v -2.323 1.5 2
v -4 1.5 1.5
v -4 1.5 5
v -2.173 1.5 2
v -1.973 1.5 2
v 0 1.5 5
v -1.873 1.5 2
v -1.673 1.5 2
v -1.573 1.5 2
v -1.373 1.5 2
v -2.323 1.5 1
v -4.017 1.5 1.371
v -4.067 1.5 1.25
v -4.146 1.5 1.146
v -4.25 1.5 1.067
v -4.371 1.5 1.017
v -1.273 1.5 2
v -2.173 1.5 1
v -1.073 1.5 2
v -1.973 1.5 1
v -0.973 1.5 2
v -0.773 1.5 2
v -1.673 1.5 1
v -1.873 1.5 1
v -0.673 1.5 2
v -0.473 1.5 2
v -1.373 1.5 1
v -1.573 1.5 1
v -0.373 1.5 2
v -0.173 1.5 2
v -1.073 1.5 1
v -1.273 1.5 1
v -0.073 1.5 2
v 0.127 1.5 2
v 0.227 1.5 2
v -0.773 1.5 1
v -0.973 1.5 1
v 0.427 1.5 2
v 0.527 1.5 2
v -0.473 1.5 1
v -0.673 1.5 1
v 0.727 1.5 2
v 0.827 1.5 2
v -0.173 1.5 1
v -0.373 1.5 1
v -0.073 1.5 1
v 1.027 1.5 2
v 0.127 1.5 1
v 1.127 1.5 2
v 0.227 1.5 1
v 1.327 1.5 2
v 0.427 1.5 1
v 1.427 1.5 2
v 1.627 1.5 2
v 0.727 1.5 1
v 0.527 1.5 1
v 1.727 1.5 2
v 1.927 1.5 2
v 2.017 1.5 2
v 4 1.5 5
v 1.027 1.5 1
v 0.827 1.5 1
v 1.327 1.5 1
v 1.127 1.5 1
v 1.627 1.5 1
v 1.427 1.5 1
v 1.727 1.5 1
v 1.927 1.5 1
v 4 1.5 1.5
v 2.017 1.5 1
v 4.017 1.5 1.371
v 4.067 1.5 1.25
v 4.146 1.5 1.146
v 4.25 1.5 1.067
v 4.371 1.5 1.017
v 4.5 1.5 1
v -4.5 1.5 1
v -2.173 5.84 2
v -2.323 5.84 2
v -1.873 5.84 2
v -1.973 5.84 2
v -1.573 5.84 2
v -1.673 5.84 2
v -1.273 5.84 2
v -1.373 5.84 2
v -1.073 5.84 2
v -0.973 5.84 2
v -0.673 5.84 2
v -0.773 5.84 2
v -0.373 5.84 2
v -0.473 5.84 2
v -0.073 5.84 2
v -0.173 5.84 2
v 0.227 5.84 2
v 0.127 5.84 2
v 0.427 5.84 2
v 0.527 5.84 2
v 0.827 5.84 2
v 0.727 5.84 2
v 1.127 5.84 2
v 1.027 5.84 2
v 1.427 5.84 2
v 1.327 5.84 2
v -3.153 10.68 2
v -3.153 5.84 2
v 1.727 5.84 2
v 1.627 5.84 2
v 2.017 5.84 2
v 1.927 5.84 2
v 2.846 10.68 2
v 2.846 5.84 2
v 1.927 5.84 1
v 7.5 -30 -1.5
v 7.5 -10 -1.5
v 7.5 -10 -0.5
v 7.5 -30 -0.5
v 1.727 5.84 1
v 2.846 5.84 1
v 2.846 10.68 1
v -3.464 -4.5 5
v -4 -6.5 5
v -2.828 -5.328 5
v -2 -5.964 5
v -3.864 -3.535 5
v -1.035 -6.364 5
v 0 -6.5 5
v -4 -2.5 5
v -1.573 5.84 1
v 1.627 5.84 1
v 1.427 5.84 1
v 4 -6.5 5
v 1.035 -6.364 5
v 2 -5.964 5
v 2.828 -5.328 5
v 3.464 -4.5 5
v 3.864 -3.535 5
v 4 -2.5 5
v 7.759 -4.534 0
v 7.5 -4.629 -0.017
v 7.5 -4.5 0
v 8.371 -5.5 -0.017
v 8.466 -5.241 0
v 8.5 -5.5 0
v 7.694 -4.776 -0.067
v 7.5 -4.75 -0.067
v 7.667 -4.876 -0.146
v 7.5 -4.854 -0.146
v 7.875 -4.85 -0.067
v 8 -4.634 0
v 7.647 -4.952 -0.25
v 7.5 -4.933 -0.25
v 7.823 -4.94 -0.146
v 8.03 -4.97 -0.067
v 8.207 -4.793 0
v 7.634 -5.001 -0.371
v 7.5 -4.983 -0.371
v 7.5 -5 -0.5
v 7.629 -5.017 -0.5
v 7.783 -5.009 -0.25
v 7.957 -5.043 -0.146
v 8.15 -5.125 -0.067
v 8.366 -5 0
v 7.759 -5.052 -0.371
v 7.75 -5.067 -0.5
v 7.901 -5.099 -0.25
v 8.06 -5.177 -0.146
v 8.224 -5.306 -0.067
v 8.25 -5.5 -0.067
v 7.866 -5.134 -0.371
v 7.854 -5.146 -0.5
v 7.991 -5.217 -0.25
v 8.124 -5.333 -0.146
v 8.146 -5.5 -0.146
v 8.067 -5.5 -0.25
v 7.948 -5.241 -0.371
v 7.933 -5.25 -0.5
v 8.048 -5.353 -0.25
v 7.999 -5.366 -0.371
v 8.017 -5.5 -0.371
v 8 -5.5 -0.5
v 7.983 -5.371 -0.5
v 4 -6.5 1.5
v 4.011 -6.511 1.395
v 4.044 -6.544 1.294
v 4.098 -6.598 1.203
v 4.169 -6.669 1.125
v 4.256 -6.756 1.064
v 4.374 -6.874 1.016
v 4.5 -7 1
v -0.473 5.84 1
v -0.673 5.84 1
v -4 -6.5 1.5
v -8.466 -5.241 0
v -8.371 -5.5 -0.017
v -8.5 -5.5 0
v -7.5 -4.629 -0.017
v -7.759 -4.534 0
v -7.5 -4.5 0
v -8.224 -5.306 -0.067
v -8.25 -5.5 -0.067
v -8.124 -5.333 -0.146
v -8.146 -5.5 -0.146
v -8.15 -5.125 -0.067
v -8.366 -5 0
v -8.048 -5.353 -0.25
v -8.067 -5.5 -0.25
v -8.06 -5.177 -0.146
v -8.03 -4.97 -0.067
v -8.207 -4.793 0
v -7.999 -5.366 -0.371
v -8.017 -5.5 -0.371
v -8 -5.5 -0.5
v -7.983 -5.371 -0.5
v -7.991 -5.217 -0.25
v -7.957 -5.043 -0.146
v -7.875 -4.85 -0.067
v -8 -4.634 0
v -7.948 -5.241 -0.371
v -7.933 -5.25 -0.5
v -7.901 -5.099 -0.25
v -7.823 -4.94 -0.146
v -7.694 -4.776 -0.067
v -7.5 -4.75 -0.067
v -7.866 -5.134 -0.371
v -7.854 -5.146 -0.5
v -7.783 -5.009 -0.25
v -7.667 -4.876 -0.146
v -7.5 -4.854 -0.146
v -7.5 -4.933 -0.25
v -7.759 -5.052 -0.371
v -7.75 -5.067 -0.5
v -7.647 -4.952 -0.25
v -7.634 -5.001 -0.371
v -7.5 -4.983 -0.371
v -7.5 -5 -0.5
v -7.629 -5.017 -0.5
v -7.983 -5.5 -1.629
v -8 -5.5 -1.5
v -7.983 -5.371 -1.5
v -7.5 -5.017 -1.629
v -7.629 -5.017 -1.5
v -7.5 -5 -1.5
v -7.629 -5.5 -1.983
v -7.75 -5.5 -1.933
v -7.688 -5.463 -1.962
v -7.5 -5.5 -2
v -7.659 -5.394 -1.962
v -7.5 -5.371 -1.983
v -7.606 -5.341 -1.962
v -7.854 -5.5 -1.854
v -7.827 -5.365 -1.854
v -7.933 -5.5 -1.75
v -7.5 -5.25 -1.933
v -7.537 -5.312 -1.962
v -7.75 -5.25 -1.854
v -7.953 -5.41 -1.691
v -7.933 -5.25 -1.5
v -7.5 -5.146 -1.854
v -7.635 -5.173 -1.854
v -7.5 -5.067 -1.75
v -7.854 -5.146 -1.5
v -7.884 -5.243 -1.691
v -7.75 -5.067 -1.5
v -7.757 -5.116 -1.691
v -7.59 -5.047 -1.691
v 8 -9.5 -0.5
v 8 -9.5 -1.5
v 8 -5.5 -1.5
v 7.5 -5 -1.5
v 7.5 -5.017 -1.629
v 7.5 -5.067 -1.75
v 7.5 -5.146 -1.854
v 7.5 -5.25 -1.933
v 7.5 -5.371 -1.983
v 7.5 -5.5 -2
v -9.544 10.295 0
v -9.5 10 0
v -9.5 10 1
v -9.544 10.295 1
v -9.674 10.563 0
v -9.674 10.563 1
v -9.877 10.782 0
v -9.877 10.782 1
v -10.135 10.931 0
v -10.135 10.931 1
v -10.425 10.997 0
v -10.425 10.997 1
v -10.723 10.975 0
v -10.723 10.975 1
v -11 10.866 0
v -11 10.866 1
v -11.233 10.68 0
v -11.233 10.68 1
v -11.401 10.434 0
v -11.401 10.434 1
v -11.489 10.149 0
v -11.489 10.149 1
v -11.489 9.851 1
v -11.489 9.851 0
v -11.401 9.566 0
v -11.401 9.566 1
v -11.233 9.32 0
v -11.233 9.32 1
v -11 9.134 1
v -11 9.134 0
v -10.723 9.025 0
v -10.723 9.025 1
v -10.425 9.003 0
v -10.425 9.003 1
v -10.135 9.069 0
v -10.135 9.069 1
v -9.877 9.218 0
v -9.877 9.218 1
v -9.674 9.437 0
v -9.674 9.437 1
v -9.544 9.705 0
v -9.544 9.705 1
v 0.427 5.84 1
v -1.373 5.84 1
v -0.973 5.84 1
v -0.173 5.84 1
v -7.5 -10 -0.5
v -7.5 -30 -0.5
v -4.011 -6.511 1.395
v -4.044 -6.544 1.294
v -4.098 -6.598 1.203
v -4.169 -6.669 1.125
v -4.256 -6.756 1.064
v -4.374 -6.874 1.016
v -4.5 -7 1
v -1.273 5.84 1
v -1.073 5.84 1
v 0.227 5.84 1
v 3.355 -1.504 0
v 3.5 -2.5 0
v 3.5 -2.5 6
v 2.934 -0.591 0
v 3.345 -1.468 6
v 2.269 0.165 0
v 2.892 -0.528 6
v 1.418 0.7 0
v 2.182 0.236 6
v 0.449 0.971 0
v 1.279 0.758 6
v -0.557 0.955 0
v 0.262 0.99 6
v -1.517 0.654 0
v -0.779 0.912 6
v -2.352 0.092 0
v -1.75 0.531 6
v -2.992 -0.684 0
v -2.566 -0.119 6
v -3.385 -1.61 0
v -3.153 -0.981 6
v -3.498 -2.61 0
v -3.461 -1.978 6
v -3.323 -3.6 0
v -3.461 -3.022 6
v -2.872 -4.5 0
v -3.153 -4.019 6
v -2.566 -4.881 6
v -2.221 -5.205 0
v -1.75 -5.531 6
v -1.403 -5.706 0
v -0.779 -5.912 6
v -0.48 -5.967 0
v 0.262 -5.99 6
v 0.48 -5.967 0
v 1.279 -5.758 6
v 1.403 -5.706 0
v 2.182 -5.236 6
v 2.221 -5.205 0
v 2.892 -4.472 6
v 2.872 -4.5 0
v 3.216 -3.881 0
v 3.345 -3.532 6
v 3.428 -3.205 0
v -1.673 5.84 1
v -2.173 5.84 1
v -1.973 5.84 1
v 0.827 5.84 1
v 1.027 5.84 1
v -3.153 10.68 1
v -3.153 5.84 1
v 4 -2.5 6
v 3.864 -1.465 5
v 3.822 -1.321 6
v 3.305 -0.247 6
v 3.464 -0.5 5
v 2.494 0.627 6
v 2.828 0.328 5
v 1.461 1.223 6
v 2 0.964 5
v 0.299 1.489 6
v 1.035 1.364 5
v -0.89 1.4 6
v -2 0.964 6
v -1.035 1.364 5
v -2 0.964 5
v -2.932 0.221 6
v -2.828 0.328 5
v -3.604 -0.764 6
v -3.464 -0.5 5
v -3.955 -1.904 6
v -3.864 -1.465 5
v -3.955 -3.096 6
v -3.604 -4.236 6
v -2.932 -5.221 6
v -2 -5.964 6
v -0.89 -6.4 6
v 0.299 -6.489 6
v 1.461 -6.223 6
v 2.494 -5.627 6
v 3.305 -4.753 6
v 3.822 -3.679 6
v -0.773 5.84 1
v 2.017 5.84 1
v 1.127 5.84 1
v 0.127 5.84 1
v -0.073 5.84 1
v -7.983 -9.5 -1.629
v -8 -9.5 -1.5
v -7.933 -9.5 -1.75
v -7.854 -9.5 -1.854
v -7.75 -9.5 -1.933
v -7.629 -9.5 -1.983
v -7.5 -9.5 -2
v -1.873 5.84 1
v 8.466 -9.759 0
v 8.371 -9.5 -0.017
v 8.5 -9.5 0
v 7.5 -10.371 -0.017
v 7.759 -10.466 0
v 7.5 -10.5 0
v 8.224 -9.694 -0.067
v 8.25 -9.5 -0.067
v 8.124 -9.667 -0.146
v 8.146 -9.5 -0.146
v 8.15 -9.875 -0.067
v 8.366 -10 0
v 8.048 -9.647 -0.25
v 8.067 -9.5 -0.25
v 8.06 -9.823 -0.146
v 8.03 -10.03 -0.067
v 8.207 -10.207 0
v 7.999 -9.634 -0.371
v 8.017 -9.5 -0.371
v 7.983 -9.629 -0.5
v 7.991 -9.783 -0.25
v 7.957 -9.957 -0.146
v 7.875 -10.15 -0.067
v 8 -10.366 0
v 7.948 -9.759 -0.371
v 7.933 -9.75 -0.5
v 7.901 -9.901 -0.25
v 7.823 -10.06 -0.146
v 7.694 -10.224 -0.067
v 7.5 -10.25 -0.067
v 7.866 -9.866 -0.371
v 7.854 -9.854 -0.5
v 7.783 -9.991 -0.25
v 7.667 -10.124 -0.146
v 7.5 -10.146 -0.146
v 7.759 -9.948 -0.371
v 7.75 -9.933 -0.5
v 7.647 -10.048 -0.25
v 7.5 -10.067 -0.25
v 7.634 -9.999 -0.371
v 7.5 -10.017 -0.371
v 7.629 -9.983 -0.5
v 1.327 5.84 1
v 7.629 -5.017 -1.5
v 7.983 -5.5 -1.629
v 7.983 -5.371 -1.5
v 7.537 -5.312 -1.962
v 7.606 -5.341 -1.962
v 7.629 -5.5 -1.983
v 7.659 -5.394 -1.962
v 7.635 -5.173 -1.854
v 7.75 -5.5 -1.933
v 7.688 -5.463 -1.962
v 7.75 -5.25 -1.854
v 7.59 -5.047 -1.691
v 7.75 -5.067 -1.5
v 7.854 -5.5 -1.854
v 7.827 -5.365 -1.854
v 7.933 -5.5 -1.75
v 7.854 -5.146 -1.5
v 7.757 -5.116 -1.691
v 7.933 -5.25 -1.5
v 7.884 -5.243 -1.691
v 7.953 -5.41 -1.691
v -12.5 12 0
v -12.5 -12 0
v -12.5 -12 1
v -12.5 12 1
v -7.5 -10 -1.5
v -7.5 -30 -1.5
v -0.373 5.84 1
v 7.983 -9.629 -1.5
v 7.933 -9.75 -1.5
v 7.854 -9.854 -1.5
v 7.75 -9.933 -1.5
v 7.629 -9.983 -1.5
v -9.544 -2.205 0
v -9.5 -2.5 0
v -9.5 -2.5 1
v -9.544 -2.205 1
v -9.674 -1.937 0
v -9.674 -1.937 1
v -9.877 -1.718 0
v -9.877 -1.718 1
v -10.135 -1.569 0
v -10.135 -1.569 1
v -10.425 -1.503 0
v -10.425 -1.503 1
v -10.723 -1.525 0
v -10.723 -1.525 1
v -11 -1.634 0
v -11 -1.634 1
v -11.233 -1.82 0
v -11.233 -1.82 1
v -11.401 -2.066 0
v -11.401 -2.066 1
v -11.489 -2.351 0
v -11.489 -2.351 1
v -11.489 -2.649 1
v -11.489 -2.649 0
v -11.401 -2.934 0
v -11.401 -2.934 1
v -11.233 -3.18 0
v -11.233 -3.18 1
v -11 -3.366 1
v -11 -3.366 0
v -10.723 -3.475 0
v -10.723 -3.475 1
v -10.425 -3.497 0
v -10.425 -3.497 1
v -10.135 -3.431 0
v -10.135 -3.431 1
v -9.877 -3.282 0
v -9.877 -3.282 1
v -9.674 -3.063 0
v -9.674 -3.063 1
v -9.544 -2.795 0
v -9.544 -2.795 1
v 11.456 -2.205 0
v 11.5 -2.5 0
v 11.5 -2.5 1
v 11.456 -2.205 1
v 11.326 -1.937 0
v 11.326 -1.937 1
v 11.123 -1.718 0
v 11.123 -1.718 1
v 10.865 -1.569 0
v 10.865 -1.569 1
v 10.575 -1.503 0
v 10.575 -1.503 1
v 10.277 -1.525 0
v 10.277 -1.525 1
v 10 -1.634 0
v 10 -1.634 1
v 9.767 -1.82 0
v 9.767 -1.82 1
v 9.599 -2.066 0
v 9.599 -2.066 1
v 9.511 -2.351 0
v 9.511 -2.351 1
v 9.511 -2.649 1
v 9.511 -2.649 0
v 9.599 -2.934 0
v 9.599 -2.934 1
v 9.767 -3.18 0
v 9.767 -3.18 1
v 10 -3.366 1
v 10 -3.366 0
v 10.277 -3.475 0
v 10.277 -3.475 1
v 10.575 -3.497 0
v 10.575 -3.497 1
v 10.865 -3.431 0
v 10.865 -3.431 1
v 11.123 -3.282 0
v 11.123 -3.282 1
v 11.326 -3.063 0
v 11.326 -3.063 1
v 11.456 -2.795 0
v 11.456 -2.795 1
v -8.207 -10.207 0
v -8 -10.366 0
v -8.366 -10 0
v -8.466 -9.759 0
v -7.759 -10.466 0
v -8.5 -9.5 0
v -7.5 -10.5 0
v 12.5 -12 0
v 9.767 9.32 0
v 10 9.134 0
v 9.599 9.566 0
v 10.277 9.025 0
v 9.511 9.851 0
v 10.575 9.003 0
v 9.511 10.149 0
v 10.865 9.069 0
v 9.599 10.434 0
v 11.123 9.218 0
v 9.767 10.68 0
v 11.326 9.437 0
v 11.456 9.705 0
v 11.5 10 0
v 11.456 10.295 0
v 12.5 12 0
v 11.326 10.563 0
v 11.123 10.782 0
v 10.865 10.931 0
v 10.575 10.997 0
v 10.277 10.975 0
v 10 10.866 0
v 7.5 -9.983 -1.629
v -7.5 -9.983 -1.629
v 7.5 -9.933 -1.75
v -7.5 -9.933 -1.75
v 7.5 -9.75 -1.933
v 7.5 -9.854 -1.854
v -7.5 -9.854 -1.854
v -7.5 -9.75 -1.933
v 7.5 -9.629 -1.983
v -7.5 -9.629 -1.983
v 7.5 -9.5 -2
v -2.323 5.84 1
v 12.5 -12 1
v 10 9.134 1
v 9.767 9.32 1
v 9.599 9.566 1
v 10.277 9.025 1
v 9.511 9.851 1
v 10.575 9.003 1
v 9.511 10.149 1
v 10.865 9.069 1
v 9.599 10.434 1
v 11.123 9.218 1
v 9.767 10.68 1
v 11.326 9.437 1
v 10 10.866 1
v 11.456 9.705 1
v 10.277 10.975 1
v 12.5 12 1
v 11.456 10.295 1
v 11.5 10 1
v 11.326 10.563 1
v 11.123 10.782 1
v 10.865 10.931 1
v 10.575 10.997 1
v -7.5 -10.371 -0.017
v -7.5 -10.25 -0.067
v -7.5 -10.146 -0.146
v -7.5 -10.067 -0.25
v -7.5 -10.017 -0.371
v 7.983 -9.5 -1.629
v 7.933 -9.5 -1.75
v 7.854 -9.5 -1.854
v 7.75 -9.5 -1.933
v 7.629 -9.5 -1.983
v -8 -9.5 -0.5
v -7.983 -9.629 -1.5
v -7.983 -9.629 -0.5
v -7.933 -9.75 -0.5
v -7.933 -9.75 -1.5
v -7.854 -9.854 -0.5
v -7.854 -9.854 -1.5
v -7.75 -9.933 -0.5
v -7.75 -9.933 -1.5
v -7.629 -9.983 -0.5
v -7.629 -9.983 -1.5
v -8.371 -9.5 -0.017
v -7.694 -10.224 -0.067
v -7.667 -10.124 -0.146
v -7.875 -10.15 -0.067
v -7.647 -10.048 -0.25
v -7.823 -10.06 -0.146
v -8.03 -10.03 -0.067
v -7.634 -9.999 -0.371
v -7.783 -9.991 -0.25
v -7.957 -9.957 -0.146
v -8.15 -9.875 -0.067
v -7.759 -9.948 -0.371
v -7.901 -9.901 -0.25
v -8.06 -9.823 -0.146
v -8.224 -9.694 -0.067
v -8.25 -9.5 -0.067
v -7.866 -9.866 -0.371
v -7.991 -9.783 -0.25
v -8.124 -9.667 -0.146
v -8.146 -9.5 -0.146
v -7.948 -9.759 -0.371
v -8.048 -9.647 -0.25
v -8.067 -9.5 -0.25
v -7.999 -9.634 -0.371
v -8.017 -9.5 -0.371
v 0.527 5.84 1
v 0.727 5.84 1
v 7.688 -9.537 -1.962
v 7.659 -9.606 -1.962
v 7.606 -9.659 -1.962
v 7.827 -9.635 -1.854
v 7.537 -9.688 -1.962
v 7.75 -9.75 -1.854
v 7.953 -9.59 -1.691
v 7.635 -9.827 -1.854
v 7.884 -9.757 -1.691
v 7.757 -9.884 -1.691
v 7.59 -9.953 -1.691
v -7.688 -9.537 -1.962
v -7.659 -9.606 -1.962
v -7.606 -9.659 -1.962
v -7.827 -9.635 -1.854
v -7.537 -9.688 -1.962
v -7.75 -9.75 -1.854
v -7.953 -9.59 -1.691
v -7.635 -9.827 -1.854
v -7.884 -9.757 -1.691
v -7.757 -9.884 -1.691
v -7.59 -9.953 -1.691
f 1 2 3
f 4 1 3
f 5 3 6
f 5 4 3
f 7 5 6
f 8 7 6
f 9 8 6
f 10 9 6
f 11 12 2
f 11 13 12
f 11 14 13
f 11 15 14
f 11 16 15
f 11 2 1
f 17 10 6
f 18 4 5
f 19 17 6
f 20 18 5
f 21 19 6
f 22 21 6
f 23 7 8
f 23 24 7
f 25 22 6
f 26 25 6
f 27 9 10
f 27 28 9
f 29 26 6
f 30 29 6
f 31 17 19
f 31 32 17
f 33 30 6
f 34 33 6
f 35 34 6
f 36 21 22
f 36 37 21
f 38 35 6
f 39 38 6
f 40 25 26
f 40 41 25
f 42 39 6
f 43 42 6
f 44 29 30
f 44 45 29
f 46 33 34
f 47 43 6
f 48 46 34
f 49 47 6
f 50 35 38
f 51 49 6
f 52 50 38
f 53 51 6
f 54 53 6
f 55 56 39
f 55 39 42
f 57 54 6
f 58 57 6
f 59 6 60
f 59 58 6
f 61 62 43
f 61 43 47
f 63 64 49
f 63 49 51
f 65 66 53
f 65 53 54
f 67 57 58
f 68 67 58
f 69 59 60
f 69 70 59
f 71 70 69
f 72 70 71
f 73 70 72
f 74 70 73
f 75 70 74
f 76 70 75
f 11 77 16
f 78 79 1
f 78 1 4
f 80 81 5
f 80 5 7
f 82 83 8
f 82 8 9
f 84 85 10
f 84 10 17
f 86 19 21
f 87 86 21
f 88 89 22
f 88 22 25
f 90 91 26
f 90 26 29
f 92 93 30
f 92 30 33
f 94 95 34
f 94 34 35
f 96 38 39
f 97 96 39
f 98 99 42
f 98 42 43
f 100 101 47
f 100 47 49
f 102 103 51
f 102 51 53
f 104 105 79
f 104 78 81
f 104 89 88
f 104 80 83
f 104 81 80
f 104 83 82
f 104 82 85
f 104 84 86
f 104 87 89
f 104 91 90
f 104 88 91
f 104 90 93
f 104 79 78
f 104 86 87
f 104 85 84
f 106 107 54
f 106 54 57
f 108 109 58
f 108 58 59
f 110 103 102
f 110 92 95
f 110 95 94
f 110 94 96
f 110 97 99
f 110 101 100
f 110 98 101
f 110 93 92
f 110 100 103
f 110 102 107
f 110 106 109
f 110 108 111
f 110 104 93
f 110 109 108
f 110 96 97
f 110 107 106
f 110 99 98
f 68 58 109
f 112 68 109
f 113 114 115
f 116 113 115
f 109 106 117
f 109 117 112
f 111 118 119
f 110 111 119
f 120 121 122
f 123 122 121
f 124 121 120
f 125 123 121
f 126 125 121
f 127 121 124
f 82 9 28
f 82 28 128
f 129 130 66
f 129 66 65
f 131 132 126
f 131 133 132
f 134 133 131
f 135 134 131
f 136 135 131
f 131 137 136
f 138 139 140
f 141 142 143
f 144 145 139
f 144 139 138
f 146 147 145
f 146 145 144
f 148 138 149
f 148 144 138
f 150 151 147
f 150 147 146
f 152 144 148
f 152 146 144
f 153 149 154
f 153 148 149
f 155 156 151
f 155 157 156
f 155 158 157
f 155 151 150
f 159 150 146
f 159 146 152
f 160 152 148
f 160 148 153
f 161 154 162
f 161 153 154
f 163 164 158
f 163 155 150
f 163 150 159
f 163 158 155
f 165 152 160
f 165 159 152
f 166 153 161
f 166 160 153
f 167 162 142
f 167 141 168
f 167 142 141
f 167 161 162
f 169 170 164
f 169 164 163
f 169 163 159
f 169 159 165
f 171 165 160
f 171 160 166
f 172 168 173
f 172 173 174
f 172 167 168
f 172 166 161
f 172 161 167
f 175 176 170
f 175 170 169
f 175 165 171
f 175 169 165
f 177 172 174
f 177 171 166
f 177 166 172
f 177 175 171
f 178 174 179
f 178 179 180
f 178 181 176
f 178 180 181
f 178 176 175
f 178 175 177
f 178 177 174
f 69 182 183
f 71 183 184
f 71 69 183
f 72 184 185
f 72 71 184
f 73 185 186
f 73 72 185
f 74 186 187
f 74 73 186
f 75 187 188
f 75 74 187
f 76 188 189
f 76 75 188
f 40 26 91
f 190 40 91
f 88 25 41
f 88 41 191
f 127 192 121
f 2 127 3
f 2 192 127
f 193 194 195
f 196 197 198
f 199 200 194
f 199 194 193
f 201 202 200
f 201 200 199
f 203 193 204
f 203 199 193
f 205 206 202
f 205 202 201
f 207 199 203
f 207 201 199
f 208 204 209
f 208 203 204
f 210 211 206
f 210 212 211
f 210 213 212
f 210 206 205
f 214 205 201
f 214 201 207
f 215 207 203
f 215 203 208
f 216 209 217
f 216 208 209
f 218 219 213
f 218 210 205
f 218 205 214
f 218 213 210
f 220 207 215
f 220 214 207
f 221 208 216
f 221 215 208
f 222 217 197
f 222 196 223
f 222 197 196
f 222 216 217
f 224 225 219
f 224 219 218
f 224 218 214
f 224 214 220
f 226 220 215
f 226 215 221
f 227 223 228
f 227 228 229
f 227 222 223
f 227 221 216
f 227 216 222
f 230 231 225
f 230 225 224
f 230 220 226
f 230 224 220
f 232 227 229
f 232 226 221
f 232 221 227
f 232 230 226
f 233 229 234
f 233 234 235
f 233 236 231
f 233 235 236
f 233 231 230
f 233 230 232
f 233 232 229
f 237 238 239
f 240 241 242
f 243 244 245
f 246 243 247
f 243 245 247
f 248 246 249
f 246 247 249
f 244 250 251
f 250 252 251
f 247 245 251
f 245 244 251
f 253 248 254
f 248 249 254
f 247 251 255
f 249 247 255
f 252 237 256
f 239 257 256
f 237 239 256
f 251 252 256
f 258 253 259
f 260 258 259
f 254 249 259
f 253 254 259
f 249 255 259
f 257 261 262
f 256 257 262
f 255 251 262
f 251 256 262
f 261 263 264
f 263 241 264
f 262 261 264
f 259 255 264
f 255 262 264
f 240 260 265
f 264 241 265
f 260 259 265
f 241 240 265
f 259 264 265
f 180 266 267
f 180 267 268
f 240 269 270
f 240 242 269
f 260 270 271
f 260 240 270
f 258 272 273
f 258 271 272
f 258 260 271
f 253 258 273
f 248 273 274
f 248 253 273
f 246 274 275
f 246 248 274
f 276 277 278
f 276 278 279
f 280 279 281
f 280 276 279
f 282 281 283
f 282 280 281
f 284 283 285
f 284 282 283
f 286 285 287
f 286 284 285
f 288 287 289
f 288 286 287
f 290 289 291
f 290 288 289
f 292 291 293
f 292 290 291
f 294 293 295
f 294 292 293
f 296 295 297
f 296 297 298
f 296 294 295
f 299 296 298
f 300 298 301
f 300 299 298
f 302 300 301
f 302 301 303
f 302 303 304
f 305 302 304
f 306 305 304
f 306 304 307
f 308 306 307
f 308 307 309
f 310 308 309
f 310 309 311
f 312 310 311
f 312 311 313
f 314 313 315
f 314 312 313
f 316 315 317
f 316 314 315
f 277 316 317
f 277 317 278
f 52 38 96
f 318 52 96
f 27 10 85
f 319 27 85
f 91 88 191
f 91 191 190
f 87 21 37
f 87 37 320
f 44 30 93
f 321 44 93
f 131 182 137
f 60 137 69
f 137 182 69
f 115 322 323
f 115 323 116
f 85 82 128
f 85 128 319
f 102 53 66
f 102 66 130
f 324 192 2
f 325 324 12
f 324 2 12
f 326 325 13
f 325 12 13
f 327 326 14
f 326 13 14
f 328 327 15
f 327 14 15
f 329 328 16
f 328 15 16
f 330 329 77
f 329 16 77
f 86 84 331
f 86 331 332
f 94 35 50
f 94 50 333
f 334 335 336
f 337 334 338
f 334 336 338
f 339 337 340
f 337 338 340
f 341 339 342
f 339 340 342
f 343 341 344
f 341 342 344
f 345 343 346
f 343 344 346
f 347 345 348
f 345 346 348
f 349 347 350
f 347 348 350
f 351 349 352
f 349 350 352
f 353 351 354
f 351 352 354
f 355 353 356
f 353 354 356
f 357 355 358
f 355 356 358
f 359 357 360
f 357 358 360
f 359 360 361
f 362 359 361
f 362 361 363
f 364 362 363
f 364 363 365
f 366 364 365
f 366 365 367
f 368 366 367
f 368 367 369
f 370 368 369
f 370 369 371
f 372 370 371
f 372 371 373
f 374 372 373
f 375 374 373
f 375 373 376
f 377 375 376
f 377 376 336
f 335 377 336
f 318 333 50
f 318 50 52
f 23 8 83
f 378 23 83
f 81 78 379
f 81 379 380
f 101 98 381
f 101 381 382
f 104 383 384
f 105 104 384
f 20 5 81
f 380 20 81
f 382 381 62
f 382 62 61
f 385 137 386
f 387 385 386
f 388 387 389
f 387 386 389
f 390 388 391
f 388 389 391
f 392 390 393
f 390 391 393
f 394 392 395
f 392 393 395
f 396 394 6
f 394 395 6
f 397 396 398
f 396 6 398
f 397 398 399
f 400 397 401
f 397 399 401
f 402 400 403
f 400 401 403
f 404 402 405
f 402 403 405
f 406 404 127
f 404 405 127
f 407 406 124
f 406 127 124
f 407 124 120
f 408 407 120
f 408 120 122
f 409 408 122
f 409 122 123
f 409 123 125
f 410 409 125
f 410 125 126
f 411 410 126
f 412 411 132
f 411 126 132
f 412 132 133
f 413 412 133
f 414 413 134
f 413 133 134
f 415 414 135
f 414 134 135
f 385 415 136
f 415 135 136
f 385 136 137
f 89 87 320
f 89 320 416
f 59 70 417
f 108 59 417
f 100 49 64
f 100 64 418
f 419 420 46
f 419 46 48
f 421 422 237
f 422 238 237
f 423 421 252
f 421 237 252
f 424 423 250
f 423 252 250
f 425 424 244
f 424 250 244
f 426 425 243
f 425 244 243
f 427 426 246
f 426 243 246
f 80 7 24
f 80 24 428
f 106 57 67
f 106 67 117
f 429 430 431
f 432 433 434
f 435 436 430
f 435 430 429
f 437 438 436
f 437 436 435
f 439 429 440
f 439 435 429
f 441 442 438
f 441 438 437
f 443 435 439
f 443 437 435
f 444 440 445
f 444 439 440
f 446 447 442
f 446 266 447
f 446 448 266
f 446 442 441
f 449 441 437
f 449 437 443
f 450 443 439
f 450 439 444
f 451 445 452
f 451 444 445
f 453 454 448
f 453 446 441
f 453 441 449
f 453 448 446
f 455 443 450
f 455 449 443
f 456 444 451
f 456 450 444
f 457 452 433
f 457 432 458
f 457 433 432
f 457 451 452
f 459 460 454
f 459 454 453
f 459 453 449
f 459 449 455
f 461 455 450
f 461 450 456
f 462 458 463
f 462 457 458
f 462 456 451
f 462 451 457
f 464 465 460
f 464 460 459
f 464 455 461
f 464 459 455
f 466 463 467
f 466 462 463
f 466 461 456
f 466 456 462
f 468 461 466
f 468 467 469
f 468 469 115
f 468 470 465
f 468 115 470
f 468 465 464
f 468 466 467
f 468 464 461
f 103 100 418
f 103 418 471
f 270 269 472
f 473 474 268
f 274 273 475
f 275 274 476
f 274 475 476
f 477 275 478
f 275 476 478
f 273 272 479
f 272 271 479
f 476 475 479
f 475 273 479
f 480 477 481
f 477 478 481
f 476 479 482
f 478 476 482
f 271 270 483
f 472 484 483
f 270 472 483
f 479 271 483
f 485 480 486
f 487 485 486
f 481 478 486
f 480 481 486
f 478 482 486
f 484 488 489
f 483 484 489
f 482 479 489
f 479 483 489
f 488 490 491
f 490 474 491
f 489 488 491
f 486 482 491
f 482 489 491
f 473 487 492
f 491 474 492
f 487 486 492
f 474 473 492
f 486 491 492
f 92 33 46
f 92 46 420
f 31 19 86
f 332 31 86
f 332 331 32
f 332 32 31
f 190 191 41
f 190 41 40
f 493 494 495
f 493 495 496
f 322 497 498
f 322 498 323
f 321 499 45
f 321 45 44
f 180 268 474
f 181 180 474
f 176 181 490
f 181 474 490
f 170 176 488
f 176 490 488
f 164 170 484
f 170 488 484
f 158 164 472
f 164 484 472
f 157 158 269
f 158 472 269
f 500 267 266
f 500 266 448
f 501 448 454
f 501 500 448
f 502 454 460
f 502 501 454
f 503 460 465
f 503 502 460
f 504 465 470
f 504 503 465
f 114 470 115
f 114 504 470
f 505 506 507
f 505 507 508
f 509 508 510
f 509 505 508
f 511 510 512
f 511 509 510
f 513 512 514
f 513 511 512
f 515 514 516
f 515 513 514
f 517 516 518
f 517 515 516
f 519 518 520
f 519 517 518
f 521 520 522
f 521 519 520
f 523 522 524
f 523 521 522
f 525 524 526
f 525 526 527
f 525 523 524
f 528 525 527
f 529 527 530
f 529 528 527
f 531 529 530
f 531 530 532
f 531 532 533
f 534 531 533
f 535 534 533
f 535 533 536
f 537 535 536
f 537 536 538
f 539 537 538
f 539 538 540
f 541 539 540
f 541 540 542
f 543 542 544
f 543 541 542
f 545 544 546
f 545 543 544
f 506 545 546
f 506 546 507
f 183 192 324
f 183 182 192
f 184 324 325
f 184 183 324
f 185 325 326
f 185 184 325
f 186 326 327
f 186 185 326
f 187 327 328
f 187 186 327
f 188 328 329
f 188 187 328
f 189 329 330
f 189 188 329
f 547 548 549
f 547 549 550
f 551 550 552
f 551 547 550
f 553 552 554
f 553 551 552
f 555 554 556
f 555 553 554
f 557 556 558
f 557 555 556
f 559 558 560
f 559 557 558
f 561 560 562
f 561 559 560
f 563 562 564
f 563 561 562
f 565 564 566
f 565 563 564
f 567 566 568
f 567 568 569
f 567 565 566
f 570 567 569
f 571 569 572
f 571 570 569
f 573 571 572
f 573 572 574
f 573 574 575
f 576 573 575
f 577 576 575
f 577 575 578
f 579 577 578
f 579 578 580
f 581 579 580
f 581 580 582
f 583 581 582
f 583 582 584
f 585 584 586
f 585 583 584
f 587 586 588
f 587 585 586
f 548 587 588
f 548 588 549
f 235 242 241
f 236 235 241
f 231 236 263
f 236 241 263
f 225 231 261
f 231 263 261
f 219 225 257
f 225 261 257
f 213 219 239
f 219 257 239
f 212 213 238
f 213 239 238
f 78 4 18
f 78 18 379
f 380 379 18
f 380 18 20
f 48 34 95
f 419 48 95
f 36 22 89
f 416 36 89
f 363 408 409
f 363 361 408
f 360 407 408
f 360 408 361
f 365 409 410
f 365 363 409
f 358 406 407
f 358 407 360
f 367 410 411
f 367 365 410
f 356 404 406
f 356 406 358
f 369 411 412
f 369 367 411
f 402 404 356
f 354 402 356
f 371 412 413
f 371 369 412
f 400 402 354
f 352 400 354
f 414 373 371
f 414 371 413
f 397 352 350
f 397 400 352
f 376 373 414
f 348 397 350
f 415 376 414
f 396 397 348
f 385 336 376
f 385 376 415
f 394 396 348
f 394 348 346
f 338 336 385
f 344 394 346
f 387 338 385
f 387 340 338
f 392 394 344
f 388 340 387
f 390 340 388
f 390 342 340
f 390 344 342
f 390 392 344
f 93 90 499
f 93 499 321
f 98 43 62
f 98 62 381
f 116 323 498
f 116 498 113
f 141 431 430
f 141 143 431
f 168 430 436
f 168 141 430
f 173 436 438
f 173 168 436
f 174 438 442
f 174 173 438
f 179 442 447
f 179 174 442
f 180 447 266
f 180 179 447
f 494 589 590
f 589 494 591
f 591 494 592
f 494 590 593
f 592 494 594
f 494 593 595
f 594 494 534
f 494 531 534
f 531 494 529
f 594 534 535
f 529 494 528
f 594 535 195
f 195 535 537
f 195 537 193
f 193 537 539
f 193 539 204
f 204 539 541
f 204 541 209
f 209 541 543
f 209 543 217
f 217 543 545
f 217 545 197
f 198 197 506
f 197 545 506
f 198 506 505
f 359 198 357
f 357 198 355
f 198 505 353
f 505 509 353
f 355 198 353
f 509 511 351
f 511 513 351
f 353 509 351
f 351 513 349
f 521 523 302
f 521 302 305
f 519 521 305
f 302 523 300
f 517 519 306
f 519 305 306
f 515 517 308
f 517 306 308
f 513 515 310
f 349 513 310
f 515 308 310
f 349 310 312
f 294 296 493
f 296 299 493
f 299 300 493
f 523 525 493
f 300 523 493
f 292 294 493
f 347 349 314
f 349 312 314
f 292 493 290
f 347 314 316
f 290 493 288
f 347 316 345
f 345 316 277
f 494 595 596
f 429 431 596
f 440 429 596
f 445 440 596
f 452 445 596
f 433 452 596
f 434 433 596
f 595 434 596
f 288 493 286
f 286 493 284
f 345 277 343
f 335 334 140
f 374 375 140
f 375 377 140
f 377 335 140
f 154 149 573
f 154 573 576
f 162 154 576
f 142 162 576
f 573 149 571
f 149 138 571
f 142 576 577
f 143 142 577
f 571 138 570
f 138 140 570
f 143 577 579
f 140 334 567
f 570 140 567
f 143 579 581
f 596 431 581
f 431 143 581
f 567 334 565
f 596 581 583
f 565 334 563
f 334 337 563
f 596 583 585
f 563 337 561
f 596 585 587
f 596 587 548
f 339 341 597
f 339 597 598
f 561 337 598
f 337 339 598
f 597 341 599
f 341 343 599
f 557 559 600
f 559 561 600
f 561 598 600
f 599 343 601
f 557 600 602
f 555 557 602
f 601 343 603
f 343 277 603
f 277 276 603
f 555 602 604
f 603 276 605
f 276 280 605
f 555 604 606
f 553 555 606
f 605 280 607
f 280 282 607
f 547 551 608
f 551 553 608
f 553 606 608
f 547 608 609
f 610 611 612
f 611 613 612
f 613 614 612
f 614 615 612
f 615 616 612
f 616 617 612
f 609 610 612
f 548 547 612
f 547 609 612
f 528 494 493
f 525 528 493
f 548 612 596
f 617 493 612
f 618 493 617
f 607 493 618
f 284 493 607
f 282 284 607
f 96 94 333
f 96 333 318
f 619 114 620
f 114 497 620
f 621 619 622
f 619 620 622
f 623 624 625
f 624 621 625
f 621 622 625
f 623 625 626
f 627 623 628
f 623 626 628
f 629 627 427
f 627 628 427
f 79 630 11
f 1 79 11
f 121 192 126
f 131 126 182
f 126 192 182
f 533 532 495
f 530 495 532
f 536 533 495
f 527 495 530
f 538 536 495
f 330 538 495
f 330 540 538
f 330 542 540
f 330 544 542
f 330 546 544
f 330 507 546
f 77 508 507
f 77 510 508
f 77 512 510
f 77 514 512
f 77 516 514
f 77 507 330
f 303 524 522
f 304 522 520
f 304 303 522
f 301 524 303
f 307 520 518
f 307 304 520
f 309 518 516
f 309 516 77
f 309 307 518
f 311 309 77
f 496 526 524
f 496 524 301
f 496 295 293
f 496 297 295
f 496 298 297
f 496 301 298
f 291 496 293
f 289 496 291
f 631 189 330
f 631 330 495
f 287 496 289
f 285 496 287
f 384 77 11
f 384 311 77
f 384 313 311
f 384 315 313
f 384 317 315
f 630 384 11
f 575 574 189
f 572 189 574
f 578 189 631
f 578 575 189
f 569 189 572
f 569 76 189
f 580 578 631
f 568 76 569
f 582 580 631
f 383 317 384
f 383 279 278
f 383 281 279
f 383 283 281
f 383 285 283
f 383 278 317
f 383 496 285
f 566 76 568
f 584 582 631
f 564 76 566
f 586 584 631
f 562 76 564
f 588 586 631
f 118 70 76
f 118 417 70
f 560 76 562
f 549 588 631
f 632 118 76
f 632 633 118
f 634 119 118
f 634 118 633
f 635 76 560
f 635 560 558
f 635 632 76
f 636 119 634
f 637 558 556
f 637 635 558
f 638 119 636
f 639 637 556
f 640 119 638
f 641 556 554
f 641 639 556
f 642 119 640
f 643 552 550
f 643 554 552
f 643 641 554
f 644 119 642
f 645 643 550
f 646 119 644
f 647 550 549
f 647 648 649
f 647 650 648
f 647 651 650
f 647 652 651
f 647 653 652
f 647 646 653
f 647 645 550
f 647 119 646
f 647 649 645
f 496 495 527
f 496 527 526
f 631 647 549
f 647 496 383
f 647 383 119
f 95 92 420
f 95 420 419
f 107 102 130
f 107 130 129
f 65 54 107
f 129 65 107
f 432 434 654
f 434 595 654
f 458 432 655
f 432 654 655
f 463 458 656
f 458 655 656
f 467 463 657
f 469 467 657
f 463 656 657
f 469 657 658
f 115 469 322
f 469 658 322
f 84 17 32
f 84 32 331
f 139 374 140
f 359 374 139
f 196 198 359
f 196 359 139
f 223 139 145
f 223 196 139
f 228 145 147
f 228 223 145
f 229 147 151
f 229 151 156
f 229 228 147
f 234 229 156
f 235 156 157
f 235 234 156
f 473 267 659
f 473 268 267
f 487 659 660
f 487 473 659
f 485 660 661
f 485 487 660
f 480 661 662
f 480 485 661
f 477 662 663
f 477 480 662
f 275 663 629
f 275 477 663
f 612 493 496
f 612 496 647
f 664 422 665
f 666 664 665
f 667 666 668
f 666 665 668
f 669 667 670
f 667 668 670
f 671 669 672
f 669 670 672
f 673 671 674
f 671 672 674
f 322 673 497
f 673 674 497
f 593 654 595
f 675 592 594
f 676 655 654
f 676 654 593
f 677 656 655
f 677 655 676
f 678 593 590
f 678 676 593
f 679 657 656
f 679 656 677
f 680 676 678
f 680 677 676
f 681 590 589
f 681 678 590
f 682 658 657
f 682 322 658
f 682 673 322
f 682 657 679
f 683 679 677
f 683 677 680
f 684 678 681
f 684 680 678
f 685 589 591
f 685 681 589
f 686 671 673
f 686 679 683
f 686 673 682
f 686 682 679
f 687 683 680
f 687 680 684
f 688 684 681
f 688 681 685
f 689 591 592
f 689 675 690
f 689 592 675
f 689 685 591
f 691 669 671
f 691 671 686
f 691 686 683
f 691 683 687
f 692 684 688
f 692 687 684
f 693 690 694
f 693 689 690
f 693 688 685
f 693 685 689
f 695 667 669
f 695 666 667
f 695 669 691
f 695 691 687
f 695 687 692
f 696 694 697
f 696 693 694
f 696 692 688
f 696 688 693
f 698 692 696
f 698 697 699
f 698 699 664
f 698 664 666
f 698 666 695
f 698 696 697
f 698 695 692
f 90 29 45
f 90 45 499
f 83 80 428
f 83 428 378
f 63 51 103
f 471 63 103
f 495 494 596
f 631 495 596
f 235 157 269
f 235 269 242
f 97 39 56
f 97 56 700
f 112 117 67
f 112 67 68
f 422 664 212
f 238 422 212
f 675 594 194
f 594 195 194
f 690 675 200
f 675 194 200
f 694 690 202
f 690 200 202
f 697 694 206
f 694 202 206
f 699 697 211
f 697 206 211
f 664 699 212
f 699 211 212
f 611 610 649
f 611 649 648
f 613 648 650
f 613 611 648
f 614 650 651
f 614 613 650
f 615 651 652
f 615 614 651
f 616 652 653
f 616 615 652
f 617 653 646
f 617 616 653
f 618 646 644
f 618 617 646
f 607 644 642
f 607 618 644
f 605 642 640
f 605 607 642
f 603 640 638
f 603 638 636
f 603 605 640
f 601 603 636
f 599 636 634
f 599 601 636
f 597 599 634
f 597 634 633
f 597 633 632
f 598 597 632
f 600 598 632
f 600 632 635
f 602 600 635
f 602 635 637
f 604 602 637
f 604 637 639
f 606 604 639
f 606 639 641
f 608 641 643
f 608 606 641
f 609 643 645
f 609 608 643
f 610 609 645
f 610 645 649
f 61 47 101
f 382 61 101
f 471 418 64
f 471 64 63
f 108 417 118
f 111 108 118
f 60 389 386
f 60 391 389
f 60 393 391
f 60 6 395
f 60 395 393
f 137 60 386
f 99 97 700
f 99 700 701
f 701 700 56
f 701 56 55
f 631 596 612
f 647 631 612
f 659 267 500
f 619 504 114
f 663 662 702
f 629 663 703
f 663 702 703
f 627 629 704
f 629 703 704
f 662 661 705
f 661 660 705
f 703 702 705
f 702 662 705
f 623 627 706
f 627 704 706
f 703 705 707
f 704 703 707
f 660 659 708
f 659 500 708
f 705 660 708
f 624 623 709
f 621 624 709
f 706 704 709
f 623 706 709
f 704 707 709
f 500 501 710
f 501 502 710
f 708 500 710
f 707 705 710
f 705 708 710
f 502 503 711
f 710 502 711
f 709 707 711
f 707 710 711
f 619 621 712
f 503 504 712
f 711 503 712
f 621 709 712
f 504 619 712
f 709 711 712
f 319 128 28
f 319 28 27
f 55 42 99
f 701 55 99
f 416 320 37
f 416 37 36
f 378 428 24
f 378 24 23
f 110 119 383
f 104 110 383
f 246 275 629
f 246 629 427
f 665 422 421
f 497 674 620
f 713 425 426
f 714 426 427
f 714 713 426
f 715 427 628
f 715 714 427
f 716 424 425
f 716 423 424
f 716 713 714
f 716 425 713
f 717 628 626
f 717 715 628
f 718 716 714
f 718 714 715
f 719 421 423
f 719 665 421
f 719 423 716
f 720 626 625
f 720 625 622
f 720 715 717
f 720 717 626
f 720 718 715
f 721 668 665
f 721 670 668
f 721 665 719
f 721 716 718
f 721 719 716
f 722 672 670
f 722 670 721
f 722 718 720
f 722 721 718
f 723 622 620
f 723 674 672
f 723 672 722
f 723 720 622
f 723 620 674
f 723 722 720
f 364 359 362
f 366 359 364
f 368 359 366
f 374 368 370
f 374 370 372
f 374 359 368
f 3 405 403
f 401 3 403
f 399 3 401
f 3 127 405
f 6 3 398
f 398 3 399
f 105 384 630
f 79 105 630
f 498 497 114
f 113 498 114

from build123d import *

# Parameters (mm, degrees)
SKETCH1_W           = 25
SKETCH1_H           = 24
SKETCH1_R           = 1
BOSS_EXTRUDE1_DEPTH = 1
SKETCH2_W           = 8
SKETCH2_H           = 8
BOSS_EXTRUDE2_DEPTH = 4
SKETCH3_R           = 4
BOSS_EXTRUDE3_DEPTH = 1
FILLET2_R           = 0.5
SKETCH4_W           = 16
SKETCH4_H           = 5
BOSS_EXTRUDE4_DEPTH = 2
FILLET3_R           = 0.5
SKETCH5_R           = 3.5
CUT_EXTRUDE1_DEPTH  = 6
BOSS_EXTRUDE5_DEPTH = 1
SKETCH7_W           = 0.2
SKETCH7_H           = 4.34
CUT_EXTRUDE2_DEPTH  = 1
LPATTERN1_COUNT     = 14
LPATTERN1_PITCH     = 0.3
SKETCH8_W           = 15
SKETCH8_H           = 1
BOSS_EXTRUDE6_DEPTH = 20


with BuildPart() as part:
    # Sketch1 → Boss-Extrude1 (new body)
    with BuildSketch(Plane.XY):
        Rectangle(SKETCH1_W, SKETCH1_H)
        with Locations((10.5, 10)):
            Circle(SKETCH1_R, mode=Mode.SUBTRACT)
        with Locations((-10.5, 10)):
            Circle(SKETCH1_R, mode=Mode.SUBTRACT)
        with Locations((-10.5, -2.5)):
            Circle(SKETCH1_R, mode=Mode.SUBTRACT)
        with Locations((10.5, -2.5)):
            Circle(SKETCH1_R, mode=Mode.SUBTRACT)
    extrude(amount=BOSS_EXTRUDE1_DEPTH)

    # Sketch2 → Boss-Extrude2 (add)
    with BuildSketch(Plane.XY.offset(1)):
        with Locations((0, -2.5)):
            Rectangle(SKETCH2_W, SKETCH2_H)
    extrude(amount=BOSS_EXTRUDE2_DEPTH)

    # Sketch3 → Boss-Extrude3 (add)
    with BuildSketch(Plane.XY.offset(5)):
        with Locations((0, -2.5)):
            Circle(SKETCH3_R)
    extrude(amount=BOSS_EXTRUDE3_DEPTH)

    # Fillet2
    fillet2_edges = [part.edges().sort_by_distance(p)[0] for p in [
        (4, -2.5, 1),
        (-4, -2.5, 1),
        (0, -6.5, 1),
    ]]
    fillet(fillet2_edges, radius=FILLET2_R)

    # Sketch4 → Boss-Extrude4 (add)
    with BuildSketch(Plane(origin=(0, 0, 0), x_dir=(-1, 0, 0), z_dir=(0, 0, -1))):
        with Locations((0, -7.5)):
            Rectangle(SKETCH4_W, SKETCH4_H)
    extrude(amount=BOSS_EXTRUDE4_DEPTH)

    # Fillet3
    fillet3_edges = [part.edges().sort_by_distance(p)[0] for p in [
        (-8, -7.5, 0),
        (-8, -10, -1),
        (0, -5, 0),
        (-8, -5, -1),
        (8, -7.5, 0),
        (8, -5, -1),
        (0, -10, 0),
        (8, -10, -1),
        (-8, -7.5, -2),
        (0, -5, -2),
        (8, -7.5, -2),
        (0, -10, -2),
    ]]
    fillet(fillet3_edges, radius=FILLET3_R)

    # Sketch5 → Cut-Extrude1 (cut)
    with BuildSketch(Plane.XY.offset(6)):
        with Locations((0, -2.5)):
            Circle(SKETCH5_R)
    extrude(amount=-CUT_EXTRUDE1_DEPTH, mode=Mode.SUBTRACT)

    # Sketch6 → Boss-Extrude5 (add)
    with BuildSketch(Plane.XY.offset(1)):
        Polygon((-3.152517362, 10.68), (-3.152517362, 5.84), (-2.322578899, 5.84), (-2.322578899, 1.5), (2.017421101, 1.5), (2.017421101, 5.84), (2.846354447, 5.84), (2.846354447, 6.468877905), (2.846354447, 10.68), align=None)
    extrude(amount=BOSS_EXTRUDE5_DEPTH)

    # Sketch7 → Cut-Extrude2 (cut)
    with BuildSketch(Plane.XY.offset(2)):
        with Locations((-2.072578899, 3.67)):
            Rectangle(SKETCH7_W, SKETCH7_H)
    cut_extrude2 = extrude(amount=-CUT_EXTRUDE2_DEPTH, mode=Mode.SUBTRACT)

    # LPattern1: Cut-Extrude2 ×14
    with Locations(*[(i * LPATTERN1_PITCH, 0, 0) for i in range(1, LPATTERN1_COUNT)]):
        add(cut_extrude2, mode=Mode.SUBTRACT)

    # Sketch8 → Boss-Extrude6 (add)
    with BuildSketch(Plane.XZ.offset(10)):
        with Locations((0, -1)):
            Rectangle(SKETCH8_W, SKETCH8_H)
    extrude(amount=BOSS_EXTRUDE6_DEPTH)


solid = part.part
